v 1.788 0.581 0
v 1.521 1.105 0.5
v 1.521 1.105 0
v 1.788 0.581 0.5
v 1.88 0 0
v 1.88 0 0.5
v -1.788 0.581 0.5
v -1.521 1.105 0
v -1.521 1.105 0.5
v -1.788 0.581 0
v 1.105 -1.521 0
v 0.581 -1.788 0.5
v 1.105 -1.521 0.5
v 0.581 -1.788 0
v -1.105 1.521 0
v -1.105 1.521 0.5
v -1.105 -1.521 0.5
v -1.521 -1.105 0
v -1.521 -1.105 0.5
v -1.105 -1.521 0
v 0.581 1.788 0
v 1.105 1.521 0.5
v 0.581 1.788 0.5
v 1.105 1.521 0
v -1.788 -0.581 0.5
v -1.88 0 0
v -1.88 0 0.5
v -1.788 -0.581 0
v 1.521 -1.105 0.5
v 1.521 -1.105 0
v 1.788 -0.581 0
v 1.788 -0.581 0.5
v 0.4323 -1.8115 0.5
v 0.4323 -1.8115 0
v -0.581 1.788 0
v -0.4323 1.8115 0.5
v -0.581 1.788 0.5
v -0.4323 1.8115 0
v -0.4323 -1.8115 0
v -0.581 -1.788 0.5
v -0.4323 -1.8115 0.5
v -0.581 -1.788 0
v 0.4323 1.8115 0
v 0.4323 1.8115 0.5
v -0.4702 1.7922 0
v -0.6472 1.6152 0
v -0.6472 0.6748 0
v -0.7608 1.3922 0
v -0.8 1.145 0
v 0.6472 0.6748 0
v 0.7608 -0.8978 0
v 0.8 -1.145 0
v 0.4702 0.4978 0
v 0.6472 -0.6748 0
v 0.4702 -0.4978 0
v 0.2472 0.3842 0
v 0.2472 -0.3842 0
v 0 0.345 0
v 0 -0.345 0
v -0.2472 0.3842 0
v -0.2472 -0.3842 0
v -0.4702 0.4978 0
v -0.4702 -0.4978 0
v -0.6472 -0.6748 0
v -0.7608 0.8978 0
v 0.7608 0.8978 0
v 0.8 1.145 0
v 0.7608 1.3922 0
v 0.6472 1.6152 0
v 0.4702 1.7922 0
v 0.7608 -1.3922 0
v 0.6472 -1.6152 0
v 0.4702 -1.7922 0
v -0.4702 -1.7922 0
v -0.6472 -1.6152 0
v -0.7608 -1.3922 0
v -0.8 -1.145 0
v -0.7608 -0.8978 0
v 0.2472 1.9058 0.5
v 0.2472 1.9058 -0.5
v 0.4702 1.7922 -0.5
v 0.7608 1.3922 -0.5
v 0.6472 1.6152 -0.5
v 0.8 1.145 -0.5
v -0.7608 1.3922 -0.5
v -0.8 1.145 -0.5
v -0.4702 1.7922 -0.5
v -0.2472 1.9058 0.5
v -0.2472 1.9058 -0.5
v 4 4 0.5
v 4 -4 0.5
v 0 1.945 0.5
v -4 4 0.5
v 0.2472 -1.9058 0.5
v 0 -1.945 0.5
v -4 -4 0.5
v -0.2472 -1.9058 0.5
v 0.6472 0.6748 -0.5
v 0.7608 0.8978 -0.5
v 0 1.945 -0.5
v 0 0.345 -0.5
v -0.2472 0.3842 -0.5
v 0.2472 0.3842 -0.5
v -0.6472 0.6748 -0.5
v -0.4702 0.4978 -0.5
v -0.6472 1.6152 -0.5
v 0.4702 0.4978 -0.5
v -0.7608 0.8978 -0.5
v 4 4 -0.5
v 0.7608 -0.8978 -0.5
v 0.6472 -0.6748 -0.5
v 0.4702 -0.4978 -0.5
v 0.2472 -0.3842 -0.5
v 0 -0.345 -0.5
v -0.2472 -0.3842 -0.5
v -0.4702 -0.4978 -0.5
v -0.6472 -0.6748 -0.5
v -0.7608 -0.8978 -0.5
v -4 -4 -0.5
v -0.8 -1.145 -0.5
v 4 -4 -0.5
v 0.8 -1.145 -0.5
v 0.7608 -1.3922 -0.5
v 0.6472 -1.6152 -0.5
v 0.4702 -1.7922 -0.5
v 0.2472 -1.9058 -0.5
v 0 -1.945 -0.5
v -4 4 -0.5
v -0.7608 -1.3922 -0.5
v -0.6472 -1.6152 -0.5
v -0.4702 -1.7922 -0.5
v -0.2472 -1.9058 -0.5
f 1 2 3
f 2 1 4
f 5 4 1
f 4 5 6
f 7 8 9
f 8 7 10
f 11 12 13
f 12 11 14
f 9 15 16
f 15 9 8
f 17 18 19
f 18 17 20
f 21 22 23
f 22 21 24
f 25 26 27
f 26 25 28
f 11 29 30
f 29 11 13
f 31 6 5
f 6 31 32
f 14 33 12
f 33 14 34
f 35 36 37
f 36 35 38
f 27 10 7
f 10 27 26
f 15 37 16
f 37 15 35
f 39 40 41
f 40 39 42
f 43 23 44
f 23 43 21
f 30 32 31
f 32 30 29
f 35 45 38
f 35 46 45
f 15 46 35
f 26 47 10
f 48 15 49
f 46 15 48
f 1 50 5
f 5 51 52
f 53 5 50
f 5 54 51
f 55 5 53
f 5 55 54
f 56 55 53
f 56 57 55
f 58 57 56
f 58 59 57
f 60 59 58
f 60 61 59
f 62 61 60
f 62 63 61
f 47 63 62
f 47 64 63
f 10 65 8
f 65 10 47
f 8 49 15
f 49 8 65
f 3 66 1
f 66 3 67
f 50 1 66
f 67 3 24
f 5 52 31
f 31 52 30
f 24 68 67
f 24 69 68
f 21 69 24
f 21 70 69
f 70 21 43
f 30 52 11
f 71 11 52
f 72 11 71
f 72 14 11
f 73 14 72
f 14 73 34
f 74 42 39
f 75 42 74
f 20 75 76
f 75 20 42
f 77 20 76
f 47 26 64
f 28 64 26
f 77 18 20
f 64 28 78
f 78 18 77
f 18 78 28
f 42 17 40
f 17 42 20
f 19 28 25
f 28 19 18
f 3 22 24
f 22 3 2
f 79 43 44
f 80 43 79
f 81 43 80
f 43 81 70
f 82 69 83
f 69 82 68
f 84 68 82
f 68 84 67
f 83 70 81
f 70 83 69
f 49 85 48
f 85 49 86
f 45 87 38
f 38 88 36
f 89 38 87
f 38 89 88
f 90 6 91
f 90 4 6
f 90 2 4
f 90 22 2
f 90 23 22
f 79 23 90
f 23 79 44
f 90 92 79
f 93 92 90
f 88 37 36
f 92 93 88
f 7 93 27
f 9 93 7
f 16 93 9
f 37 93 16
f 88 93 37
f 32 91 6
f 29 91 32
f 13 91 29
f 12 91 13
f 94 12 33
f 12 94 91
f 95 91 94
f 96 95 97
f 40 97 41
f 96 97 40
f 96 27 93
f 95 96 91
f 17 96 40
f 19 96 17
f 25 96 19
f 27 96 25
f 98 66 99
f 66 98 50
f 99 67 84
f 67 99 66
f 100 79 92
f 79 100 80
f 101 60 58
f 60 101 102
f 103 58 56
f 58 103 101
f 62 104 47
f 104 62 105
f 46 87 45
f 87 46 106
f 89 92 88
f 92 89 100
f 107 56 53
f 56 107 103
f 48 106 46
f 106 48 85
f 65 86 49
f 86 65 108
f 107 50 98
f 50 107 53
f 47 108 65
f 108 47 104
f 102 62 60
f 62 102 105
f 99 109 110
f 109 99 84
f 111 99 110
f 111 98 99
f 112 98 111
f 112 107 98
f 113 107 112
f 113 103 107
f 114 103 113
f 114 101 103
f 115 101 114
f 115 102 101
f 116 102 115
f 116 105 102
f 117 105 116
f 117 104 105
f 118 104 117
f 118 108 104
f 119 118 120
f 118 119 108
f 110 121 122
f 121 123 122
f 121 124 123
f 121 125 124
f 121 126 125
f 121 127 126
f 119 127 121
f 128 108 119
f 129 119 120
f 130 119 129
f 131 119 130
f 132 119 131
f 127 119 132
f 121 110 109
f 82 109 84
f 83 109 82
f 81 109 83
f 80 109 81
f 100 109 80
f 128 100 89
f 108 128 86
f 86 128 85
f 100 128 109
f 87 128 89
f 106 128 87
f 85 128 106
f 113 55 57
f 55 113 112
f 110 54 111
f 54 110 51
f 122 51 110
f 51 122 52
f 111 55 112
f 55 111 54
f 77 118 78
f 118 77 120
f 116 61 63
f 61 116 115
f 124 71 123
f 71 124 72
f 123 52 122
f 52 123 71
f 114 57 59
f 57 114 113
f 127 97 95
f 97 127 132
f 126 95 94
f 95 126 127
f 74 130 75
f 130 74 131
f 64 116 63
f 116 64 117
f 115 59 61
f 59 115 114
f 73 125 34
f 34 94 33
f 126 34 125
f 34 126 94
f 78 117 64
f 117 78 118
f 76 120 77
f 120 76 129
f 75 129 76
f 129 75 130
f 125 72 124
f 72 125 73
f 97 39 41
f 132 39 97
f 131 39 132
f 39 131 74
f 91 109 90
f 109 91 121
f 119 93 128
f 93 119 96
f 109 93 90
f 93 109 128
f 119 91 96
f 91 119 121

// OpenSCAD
t = 1;
led_r = 3.36/2;
wire_d = 2.77 - 0.48; //2.54;
wire_h = 0.8;

eps = 0.2;
$fn=20;

module led_inset(led_r = led_r, t = t, wire_d=wire_d, eps=0.2){
    translate([0, 0, t/2])
    cylinder(t, led_r + eps, led_r + eps, center=true);
    translate([0, wire_d/2, 0])
    cylinder(t, wire_h, wire_h, center=true);
    translate([0, -wire_d/2, 0])
    cylinder(t, wire_h, wire_h, center=true);
}
difference(){
    cube([8, 8, t], center=true);
    led_inset();
}
